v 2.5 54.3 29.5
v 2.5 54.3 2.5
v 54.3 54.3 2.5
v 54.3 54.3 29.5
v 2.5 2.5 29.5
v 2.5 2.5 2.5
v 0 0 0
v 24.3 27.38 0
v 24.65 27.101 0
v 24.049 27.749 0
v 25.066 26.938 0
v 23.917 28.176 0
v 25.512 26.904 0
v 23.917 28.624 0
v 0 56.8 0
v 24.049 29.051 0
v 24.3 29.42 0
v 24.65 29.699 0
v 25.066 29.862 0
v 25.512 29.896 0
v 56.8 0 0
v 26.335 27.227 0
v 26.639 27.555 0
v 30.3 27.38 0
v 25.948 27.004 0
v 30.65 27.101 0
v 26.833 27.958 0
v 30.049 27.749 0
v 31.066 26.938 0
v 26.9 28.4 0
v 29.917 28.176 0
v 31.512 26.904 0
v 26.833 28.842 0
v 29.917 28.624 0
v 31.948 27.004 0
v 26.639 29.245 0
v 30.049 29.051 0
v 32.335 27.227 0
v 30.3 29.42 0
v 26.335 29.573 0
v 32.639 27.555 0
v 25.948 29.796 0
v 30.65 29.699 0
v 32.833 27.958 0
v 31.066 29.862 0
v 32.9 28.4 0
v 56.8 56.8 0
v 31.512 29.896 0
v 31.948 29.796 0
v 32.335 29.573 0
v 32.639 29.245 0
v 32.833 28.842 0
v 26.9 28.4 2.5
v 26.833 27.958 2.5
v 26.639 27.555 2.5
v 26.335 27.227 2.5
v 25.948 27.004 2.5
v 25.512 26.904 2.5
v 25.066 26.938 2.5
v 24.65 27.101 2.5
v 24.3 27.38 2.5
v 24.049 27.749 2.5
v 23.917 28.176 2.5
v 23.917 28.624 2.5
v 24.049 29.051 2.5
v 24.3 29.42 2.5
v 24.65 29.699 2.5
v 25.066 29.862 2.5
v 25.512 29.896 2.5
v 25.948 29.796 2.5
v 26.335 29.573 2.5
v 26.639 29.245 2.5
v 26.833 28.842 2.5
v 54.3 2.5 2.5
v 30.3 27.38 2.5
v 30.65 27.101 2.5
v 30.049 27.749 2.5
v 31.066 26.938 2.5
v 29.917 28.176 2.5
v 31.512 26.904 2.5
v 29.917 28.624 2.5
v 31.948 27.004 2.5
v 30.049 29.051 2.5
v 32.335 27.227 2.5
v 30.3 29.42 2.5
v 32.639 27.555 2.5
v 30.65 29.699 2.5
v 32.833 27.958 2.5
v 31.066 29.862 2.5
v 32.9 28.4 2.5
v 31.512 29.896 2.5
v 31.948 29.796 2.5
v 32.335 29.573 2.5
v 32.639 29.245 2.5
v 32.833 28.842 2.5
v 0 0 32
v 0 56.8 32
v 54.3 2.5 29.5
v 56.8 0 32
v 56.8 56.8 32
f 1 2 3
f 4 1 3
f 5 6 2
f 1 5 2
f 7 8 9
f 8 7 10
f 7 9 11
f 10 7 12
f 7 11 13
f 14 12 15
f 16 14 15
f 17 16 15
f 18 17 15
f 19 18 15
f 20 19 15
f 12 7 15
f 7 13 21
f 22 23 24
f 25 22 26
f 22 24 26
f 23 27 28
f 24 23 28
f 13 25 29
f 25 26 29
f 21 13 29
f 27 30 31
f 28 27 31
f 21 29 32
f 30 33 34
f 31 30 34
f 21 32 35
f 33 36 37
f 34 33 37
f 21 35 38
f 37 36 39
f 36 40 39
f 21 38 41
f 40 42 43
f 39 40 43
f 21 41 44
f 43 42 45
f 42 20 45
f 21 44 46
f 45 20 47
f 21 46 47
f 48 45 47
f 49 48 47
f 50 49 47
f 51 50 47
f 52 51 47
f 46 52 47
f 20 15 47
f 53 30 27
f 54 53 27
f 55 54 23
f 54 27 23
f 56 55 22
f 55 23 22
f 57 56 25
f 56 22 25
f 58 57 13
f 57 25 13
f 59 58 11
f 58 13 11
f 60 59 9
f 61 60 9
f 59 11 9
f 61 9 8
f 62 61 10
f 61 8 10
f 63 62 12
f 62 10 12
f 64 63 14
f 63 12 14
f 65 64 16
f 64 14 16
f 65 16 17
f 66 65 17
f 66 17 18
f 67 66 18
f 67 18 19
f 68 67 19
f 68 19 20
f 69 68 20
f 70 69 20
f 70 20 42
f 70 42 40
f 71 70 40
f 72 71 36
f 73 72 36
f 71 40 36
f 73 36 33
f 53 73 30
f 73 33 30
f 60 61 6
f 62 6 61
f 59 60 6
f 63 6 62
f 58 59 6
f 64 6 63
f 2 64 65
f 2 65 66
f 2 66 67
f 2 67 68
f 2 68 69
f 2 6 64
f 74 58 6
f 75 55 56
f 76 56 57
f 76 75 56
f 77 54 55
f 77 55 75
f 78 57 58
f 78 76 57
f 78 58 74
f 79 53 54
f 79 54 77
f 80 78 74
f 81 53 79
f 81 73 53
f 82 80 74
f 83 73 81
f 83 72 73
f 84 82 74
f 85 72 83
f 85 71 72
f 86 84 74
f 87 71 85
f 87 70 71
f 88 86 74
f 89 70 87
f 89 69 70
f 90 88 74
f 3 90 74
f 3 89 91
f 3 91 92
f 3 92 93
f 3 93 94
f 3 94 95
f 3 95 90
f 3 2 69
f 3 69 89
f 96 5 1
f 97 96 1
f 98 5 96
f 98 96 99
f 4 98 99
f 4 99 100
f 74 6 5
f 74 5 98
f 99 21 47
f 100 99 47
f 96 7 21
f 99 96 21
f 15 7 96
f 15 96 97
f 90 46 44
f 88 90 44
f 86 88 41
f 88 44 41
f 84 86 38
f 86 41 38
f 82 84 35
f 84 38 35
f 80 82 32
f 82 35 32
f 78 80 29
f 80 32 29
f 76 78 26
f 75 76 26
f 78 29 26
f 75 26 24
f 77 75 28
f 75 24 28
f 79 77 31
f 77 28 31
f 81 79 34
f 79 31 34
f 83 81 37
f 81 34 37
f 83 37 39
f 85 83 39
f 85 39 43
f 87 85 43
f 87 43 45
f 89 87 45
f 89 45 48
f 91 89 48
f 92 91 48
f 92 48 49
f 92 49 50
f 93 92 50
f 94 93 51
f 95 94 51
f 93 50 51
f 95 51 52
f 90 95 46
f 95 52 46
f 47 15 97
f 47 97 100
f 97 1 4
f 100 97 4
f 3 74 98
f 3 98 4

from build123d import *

# Parameters (mm, degrees)
F0_W     = 56.8
F0_H     = 56.8
F1_DEPTH = 32
F2_T     = -2.5
F3_R     = 1.5
F4_DEPTH = 2.5
F5_SIZE  = 2.49999


# Not quite as in the source:
# - a fillet or chamfer is up to 0.001 mm smaller than in the source, because OpenCascade refuses the exact size


with BuildPart() as f1:
    # F0 (on Top) → F1 (new body)
    with BuildSketch(Plane.XY):
        with Locations((28.4, 28.4)):
            Rectangle(F0_W, F0_H)
    extrude(amount=F1_DEPTH)

    # F2
    f2_openings = [f1.faces().sort_by_distance(p)[0] for p in [
        (28.4, 28.4, 32),
    ]]
    offset(amount=F2_T, openings=f2_openings)

    # F3 (on face) → F4 (cut, through all)
    with BuildSketch(Plane(origin=(0, 0, 0), x_dir=(1, 0, 0), z_dir=(0, 0, -1))):
        with Locations((25.4, -28.4)):
            Circle(F3_R)
        with Locations((31.4, -28.4)):
            Circle(F3_R)
    extrude(amount=-F4_DEPTH, mode=Mode.SUBTRACT)

    # F5 (size 2.5 in the source; OpenCascade refuses exactly that, so slightly less here)
    f5_edges = [f1.edges().sort_by_distance(p)[0] for p in [
        (2.5, 28.4, 32),
        (28.4, 2.5, 32),
        (54.3, 28.4, 32),
        (28.4, 54.3, 32),
    ]]
    chamfer(f5_edges, length=F5_SIZE)


solid = f1.part
